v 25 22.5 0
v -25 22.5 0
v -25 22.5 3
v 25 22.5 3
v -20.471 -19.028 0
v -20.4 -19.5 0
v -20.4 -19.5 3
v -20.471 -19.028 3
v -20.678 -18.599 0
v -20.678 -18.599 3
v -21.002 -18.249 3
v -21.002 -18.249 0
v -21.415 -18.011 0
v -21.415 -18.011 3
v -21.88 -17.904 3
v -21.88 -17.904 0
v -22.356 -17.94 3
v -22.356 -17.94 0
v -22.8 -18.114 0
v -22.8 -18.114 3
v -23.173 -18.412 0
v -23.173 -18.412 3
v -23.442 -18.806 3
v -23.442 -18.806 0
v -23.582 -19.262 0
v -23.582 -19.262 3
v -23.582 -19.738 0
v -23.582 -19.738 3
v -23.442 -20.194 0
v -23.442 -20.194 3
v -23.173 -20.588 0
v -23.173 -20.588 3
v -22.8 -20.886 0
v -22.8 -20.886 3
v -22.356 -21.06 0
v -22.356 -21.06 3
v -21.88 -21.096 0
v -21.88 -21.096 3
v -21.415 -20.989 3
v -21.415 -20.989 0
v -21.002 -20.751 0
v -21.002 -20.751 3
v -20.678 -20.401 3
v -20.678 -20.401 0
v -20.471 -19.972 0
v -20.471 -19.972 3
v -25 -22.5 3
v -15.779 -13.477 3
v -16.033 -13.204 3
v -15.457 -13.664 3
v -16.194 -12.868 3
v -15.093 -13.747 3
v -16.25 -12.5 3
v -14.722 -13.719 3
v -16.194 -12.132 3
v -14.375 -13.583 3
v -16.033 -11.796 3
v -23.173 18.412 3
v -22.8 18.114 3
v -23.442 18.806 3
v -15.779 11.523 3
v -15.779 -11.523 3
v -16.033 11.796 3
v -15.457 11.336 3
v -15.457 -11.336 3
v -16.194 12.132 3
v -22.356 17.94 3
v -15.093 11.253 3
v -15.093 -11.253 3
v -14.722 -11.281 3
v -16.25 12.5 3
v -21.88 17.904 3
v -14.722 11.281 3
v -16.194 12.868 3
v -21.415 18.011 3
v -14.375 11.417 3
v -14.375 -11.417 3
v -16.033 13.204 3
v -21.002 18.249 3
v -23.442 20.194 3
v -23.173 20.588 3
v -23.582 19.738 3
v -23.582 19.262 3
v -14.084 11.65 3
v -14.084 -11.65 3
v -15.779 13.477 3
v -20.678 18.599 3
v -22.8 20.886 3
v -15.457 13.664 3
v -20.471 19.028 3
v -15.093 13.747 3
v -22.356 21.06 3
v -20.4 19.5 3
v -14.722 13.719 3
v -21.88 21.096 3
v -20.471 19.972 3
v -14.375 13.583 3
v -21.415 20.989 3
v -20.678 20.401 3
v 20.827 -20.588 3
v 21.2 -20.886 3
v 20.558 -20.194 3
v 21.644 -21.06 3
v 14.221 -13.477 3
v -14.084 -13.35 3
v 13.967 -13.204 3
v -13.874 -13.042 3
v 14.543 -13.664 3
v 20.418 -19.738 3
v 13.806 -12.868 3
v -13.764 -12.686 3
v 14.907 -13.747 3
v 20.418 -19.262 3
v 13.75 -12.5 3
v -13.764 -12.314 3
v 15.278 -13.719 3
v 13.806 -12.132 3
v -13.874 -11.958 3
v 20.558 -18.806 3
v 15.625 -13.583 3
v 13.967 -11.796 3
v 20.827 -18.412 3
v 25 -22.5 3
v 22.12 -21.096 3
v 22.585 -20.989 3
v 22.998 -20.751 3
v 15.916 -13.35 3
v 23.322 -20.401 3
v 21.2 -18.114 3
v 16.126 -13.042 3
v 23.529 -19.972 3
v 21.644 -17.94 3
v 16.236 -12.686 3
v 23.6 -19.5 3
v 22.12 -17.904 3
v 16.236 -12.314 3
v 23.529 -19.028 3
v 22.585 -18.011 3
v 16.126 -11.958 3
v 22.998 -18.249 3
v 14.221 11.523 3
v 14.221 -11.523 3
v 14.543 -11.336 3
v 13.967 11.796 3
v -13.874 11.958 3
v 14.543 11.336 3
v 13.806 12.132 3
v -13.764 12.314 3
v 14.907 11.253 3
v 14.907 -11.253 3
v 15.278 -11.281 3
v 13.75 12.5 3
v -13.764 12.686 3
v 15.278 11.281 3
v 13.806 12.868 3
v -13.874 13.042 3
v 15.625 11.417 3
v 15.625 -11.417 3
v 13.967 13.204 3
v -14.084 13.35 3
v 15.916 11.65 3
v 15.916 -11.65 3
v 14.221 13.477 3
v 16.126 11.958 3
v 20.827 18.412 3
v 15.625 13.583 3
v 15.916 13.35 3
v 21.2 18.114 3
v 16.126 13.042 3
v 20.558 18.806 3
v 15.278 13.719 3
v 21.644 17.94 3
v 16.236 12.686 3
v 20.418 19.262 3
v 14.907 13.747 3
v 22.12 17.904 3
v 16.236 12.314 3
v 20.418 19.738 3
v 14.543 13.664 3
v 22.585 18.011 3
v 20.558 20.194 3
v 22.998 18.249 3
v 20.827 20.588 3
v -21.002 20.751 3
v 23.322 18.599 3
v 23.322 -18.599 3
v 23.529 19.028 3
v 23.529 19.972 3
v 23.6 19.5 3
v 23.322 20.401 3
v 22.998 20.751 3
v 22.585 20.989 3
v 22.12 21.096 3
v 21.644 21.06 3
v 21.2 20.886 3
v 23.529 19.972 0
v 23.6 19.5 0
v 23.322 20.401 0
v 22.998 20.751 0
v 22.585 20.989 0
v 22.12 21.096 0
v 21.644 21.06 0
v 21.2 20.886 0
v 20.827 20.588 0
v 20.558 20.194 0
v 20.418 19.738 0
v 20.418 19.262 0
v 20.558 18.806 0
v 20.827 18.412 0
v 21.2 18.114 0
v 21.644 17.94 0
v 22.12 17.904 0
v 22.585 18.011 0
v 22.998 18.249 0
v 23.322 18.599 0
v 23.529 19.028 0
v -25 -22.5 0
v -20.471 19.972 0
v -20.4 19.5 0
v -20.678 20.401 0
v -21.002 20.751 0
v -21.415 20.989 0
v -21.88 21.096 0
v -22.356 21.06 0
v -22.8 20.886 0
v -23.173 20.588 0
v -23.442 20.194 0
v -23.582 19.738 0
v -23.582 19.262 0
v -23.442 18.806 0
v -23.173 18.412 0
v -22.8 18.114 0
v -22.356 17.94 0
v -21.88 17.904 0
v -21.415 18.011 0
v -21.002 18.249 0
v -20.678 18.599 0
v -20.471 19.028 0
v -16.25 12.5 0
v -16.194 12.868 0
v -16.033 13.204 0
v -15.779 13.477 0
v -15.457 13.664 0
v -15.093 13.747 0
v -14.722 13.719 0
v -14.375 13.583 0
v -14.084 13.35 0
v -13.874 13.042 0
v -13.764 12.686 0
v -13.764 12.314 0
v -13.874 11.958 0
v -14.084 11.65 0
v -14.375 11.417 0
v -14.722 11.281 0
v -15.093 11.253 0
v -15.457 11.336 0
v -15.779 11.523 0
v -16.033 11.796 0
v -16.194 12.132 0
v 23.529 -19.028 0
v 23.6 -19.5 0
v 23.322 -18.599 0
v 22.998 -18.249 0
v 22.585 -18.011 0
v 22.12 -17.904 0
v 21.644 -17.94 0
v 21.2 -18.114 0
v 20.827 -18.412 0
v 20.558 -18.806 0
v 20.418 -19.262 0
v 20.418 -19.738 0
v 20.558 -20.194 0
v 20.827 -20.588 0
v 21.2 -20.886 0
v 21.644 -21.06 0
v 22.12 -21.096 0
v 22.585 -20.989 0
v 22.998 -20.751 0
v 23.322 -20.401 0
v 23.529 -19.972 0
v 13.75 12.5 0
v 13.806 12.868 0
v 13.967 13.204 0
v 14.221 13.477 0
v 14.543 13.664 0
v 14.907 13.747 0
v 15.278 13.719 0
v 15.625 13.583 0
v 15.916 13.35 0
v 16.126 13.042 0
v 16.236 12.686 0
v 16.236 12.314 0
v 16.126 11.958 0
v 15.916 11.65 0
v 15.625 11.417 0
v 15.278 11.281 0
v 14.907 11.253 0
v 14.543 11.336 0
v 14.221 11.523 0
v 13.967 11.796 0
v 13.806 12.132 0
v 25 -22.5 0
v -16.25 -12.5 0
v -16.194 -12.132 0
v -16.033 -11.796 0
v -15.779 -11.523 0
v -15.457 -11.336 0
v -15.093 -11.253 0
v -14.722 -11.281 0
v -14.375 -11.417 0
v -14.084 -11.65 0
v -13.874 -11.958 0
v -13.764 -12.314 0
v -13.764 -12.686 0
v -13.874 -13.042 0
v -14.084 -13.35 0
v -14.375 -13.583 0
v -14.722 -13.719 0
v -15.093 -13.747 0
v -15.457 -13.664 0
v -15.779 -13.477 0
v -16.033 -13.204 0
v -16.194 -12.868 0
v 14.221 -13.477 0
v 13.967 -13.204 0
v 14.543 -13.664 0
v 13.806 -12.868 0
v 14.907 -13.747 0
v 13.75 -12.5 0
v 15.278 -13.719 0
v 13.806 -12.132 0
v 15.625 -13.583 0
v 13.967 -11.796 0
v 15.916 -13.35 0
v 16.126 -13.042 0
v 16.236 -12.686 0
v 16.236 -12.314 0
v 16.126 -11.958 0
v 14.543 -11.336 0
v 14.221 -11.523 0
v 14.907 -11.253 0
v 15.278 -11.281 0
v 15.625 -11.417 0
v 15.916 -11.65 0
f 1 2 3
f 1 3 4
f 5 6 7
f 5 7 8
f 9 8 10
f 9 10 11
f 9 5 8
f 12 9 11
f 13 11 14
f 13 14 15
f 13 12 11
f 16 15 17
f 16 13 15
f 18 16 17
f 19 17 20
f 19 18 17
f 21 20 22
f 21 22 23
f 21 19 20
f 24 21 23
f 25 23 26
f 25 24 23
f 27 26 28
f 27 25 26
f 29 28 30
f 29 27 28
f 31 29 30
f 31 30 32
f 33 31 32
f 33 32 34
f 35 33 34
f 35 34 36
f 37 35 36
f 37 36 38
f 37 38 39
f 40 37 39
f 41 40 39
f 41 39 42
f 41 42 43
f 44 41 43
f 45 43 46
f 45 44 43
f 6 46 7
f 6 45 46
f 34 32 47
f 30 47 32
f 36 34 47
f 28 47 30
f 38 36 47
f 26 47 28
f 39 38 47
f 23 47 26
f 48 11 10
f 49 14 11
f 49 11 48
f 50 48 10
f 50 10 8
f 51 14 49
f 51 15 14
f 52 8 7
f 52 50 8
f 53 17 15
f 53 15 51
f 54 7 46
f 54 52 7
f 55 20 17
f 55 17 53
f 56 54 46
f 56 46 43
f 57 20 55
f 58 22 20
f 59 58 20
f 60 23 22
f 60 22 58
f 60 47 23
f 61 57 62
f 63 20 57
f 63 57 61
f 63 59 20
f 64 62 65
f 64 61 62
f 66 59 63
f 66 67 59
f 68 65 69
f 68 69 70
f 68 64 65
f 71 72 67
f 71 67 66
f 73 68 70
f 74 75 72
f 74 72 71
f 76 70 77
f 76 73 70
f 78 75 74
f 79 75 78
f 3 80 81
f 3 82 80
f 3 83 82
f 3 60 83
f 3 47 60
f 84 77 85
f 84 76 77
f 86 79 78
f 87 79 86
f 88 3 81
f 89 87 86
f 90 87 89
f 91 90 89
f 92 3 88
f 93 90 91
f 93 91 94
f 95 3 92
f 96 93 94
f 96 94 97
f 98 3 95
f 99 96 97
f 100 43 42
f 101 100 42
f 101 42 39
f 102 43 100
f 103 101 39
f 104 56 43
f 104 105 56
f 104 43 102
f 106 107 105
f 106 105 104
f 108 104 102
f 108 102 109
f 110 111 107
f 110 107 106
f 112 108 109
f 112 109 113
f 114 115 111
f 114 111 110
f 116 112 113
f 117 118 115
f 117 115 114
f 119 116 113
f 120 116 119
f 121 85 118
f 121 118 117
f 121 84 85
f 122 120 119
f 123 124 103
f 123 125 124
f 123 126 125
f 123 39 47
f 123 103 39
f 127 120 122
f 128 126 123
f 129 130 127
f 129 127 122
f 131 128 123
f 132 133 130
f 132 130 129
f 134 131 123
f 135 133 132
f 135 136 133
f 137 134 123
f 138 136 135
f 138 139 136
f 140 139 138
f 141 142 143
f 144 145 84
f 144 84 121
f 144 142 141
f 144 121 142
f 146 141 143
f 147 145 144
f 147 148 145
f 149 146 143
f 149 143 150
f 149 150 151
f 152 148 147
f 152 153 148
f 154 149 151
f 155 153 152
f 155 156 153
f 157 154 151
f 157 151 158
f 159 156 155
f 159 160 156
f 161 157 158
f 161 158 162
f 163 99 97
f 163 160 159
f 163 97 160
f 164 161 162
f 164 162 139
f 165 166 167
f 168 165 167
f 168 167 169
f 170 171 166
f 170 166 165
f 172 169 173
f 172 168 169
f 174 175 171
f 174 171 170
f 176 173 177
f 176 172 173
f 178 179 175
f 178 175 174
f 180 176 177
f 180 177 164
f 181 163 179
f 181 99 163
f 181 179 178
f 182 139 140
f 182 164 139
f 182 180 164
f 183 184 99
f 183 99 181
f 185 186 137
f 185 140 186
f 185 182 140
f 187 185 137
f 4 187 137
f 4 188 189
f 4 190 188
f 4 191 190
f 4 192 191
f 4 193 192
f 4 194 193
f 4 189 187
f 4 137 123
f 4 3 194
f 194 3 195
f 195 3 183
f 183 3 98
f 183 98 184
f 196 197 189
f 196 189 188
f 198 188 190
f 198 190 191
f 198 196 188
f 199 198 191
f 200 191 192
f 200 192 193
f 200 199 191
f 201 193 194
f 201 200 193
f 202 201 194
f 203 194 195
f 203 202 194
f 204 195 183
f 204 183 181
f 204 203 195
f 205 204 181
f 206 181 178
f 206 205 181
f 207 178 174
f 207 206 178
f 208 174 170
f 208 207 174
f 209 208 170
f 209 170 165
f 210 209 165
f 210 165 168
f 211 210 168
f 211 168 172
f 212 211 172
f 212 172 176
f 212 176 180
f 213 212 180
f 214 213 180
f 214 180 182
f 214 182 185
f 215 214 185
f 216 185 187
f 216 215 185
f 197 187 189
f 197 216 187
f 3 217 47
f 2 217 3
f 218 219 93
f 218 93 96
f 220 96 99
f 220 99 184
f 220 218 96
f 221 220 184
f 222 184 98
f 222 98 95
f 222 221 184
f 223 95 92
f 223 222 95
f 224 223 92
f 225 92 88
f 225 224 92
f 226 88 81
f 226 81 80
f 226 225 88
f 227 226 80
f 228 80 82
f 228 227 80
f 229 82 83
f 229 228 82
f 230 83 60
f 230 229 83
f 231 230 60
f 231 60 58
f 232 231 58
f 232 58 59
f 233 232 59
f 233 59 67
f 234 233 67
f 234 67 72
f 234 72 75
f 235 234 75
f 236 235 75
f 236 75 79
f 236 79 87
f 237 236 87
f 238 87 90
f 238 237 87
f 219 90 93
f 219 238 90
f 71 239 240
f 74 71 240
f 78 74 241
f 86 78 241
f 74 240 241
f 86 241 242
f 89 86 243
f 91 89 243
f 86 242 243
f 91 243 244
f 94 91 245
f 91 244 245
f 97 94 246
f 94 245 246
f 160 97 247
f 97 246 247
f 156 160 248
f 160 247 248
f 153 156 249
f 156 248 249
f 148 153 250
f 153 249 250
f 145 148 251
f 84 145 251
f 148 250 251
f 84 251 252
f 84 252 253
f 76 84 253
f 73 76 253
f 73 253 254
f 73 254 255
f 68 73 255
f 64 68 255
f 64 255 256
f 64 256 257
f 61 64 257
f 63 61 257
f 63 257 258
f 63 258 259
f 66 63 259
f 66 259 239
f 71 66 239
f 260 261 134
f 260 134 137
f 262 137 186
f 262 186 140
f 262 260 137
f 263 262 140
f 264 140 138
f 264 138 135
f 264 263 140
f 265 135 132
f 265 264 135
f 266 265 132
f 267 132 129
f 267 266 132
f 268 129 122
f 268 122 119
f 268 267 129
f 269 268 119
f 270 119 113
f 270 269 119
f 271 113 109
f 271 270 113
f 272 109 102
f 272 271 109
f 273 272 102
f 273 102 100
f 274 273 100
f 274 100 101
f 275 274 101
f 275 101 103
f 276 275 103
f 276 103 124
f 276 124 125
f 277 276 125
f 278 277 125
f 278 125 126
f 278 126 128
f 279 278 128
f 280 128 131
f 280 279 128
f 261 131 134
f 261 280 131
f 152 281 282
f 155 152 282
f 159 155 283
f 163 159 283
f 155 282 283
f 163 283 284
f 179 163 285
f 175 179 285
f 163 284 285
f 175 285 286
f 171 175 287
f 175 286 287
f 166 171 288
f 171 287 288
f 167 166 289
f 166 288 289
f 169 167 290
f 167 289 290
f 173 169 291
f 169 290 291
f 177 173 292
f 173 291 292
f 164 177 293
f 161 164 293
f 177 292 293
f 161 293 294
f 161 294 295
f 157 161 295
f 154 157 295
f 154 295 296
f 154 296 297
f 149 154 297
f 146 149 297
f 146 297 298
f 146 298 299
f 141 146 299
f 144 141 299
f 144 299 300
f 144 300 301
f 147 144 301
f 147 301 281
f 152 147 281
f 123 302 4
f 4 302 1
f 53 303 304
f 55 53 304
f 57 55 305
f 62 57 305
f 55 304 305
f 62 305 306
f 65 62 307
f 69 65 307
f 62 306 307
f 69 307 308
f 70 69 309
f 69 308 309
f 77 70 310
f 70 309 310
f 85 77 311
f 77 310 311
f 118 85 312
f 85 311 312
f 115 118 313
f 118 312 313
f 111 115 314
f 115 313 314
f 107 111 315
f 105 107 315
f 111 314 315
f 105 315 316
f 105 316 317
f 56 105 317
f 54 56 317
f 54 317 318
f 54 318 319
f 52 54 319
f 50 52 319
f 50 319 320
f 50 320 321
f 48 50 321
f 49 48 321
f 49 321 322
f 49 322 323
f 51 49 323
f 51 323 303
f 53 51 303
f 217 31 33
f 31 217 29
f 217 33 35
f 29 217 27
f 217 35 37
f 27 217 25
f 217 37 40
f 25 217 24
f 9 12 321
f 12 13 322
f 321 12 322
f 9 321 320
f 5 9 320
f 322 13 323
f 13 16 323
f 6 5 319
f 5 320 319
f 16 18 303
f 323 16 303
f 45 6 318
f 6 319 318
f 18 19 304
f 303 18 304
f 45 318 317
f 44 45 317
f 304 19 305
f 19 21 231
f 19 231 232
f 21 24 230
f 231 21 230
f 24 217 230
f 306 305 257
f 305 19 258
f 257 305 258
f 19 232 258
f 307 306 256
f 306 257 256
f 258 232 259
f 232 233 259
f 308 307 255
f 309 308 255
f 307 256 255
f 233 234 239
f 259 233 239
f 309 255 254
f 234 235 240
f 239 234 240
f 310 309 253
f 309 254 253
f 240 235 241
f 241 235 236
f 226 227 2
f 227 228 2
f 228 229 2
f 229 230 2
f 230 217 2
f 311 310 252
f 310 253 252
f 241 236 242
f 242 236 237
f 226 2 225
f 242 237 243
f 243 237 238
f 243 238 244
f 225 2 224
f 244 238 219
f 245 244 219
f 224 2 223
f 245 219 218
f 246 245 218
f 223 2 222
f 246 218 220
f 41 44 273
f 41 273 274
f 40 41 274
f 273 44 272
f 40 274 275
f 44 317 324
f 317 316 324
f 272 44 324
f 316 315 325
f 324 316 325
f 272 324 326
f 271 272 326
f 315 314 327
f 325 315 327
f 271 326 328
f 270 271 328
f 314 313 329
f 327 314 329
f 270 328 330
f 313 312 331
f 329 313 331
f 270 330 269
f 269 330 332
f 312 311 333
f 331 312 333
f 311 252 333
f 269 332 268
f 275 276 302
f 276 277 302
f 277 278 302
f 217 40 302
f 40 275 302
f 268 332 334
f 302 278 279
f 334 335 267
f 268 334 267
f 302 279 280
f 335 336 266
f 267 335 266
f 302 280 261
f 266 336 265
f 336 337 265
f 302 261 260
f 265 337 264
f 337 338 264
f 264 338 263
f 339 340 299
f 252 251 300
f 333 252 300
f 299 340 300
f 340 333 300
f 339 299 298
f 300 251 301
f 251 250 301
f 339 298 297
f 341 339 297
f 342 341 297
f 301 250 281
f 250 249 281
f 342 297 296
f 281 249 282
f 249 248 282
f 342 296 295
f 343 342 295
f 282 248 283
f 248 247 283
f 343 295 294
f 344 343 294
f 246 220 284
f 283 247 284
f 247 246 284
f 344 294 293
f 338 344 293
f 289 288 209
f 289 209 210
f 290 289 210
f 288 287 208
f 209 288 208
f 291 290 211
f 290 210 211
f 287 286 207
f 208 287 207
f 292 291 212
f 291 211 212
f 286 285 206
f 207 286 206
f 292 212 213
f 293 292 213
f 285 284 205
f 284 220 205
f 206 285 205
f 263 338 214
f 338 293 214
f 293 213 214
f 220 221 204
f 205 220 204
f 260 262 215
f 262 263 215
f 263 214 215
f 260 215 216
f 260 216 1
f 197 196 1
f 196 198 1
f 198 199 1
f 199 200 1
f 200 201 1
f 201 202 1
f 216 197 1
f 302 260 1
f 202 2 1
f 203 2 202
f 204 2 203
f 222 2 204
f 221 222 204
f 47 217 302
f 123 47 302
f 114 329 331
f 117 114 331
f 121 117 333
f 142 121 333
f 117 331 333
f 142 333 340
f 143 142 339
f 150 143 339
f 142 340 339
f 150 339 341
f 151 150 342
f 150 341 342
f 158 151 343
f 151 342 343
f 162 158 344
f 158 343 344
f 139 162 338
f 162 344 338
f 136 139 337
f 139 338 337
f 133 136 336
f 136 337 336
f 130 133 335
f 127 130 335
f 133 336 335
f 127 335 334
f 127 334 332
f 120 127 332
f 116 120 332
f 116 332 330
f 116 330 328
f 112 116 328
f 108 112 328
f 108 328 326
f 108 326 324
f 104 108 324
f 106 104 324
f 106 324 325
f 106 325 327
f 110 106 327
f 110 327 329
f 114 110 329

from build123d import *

# Parameters (mm, degrees)
F0_W     = 50
F0_H     = 45
F0_R     = 1.6
F1_DEPTH = 3
F3_D     = 2.5


with BuildPart() as f1:
    # F0 (on Top) → F1 (new body)
    with BuildSketch(Plane.XY):
        Rectangle(F0_W, F0_H)
        with Locations((-22, -19.5)):
            Circle(F0_R, mode=Mode.SUBTRACT)
        with Locations((22, -19.5)):
            Circle(F0_R, mode=Mode.SUBTRACT)
        with Locations((-22, 19.5)):
            Circle(F0_R, mode=Mode.SUBTRACT)
        with Locations((22, 19.5)):
            Circle(F0_R, mode=Mode.SUBTRACT)
    extrude(amount=F1_DEPTH)

    # F3 (through all)
    with Locations(Plane.XY.offset(3)):
        with Locations((-15, 12.5), (15, 12.5), (15, -12.5), (-15, -12.5)):
            Hole(F3_D / 2)


solid = f1.part
